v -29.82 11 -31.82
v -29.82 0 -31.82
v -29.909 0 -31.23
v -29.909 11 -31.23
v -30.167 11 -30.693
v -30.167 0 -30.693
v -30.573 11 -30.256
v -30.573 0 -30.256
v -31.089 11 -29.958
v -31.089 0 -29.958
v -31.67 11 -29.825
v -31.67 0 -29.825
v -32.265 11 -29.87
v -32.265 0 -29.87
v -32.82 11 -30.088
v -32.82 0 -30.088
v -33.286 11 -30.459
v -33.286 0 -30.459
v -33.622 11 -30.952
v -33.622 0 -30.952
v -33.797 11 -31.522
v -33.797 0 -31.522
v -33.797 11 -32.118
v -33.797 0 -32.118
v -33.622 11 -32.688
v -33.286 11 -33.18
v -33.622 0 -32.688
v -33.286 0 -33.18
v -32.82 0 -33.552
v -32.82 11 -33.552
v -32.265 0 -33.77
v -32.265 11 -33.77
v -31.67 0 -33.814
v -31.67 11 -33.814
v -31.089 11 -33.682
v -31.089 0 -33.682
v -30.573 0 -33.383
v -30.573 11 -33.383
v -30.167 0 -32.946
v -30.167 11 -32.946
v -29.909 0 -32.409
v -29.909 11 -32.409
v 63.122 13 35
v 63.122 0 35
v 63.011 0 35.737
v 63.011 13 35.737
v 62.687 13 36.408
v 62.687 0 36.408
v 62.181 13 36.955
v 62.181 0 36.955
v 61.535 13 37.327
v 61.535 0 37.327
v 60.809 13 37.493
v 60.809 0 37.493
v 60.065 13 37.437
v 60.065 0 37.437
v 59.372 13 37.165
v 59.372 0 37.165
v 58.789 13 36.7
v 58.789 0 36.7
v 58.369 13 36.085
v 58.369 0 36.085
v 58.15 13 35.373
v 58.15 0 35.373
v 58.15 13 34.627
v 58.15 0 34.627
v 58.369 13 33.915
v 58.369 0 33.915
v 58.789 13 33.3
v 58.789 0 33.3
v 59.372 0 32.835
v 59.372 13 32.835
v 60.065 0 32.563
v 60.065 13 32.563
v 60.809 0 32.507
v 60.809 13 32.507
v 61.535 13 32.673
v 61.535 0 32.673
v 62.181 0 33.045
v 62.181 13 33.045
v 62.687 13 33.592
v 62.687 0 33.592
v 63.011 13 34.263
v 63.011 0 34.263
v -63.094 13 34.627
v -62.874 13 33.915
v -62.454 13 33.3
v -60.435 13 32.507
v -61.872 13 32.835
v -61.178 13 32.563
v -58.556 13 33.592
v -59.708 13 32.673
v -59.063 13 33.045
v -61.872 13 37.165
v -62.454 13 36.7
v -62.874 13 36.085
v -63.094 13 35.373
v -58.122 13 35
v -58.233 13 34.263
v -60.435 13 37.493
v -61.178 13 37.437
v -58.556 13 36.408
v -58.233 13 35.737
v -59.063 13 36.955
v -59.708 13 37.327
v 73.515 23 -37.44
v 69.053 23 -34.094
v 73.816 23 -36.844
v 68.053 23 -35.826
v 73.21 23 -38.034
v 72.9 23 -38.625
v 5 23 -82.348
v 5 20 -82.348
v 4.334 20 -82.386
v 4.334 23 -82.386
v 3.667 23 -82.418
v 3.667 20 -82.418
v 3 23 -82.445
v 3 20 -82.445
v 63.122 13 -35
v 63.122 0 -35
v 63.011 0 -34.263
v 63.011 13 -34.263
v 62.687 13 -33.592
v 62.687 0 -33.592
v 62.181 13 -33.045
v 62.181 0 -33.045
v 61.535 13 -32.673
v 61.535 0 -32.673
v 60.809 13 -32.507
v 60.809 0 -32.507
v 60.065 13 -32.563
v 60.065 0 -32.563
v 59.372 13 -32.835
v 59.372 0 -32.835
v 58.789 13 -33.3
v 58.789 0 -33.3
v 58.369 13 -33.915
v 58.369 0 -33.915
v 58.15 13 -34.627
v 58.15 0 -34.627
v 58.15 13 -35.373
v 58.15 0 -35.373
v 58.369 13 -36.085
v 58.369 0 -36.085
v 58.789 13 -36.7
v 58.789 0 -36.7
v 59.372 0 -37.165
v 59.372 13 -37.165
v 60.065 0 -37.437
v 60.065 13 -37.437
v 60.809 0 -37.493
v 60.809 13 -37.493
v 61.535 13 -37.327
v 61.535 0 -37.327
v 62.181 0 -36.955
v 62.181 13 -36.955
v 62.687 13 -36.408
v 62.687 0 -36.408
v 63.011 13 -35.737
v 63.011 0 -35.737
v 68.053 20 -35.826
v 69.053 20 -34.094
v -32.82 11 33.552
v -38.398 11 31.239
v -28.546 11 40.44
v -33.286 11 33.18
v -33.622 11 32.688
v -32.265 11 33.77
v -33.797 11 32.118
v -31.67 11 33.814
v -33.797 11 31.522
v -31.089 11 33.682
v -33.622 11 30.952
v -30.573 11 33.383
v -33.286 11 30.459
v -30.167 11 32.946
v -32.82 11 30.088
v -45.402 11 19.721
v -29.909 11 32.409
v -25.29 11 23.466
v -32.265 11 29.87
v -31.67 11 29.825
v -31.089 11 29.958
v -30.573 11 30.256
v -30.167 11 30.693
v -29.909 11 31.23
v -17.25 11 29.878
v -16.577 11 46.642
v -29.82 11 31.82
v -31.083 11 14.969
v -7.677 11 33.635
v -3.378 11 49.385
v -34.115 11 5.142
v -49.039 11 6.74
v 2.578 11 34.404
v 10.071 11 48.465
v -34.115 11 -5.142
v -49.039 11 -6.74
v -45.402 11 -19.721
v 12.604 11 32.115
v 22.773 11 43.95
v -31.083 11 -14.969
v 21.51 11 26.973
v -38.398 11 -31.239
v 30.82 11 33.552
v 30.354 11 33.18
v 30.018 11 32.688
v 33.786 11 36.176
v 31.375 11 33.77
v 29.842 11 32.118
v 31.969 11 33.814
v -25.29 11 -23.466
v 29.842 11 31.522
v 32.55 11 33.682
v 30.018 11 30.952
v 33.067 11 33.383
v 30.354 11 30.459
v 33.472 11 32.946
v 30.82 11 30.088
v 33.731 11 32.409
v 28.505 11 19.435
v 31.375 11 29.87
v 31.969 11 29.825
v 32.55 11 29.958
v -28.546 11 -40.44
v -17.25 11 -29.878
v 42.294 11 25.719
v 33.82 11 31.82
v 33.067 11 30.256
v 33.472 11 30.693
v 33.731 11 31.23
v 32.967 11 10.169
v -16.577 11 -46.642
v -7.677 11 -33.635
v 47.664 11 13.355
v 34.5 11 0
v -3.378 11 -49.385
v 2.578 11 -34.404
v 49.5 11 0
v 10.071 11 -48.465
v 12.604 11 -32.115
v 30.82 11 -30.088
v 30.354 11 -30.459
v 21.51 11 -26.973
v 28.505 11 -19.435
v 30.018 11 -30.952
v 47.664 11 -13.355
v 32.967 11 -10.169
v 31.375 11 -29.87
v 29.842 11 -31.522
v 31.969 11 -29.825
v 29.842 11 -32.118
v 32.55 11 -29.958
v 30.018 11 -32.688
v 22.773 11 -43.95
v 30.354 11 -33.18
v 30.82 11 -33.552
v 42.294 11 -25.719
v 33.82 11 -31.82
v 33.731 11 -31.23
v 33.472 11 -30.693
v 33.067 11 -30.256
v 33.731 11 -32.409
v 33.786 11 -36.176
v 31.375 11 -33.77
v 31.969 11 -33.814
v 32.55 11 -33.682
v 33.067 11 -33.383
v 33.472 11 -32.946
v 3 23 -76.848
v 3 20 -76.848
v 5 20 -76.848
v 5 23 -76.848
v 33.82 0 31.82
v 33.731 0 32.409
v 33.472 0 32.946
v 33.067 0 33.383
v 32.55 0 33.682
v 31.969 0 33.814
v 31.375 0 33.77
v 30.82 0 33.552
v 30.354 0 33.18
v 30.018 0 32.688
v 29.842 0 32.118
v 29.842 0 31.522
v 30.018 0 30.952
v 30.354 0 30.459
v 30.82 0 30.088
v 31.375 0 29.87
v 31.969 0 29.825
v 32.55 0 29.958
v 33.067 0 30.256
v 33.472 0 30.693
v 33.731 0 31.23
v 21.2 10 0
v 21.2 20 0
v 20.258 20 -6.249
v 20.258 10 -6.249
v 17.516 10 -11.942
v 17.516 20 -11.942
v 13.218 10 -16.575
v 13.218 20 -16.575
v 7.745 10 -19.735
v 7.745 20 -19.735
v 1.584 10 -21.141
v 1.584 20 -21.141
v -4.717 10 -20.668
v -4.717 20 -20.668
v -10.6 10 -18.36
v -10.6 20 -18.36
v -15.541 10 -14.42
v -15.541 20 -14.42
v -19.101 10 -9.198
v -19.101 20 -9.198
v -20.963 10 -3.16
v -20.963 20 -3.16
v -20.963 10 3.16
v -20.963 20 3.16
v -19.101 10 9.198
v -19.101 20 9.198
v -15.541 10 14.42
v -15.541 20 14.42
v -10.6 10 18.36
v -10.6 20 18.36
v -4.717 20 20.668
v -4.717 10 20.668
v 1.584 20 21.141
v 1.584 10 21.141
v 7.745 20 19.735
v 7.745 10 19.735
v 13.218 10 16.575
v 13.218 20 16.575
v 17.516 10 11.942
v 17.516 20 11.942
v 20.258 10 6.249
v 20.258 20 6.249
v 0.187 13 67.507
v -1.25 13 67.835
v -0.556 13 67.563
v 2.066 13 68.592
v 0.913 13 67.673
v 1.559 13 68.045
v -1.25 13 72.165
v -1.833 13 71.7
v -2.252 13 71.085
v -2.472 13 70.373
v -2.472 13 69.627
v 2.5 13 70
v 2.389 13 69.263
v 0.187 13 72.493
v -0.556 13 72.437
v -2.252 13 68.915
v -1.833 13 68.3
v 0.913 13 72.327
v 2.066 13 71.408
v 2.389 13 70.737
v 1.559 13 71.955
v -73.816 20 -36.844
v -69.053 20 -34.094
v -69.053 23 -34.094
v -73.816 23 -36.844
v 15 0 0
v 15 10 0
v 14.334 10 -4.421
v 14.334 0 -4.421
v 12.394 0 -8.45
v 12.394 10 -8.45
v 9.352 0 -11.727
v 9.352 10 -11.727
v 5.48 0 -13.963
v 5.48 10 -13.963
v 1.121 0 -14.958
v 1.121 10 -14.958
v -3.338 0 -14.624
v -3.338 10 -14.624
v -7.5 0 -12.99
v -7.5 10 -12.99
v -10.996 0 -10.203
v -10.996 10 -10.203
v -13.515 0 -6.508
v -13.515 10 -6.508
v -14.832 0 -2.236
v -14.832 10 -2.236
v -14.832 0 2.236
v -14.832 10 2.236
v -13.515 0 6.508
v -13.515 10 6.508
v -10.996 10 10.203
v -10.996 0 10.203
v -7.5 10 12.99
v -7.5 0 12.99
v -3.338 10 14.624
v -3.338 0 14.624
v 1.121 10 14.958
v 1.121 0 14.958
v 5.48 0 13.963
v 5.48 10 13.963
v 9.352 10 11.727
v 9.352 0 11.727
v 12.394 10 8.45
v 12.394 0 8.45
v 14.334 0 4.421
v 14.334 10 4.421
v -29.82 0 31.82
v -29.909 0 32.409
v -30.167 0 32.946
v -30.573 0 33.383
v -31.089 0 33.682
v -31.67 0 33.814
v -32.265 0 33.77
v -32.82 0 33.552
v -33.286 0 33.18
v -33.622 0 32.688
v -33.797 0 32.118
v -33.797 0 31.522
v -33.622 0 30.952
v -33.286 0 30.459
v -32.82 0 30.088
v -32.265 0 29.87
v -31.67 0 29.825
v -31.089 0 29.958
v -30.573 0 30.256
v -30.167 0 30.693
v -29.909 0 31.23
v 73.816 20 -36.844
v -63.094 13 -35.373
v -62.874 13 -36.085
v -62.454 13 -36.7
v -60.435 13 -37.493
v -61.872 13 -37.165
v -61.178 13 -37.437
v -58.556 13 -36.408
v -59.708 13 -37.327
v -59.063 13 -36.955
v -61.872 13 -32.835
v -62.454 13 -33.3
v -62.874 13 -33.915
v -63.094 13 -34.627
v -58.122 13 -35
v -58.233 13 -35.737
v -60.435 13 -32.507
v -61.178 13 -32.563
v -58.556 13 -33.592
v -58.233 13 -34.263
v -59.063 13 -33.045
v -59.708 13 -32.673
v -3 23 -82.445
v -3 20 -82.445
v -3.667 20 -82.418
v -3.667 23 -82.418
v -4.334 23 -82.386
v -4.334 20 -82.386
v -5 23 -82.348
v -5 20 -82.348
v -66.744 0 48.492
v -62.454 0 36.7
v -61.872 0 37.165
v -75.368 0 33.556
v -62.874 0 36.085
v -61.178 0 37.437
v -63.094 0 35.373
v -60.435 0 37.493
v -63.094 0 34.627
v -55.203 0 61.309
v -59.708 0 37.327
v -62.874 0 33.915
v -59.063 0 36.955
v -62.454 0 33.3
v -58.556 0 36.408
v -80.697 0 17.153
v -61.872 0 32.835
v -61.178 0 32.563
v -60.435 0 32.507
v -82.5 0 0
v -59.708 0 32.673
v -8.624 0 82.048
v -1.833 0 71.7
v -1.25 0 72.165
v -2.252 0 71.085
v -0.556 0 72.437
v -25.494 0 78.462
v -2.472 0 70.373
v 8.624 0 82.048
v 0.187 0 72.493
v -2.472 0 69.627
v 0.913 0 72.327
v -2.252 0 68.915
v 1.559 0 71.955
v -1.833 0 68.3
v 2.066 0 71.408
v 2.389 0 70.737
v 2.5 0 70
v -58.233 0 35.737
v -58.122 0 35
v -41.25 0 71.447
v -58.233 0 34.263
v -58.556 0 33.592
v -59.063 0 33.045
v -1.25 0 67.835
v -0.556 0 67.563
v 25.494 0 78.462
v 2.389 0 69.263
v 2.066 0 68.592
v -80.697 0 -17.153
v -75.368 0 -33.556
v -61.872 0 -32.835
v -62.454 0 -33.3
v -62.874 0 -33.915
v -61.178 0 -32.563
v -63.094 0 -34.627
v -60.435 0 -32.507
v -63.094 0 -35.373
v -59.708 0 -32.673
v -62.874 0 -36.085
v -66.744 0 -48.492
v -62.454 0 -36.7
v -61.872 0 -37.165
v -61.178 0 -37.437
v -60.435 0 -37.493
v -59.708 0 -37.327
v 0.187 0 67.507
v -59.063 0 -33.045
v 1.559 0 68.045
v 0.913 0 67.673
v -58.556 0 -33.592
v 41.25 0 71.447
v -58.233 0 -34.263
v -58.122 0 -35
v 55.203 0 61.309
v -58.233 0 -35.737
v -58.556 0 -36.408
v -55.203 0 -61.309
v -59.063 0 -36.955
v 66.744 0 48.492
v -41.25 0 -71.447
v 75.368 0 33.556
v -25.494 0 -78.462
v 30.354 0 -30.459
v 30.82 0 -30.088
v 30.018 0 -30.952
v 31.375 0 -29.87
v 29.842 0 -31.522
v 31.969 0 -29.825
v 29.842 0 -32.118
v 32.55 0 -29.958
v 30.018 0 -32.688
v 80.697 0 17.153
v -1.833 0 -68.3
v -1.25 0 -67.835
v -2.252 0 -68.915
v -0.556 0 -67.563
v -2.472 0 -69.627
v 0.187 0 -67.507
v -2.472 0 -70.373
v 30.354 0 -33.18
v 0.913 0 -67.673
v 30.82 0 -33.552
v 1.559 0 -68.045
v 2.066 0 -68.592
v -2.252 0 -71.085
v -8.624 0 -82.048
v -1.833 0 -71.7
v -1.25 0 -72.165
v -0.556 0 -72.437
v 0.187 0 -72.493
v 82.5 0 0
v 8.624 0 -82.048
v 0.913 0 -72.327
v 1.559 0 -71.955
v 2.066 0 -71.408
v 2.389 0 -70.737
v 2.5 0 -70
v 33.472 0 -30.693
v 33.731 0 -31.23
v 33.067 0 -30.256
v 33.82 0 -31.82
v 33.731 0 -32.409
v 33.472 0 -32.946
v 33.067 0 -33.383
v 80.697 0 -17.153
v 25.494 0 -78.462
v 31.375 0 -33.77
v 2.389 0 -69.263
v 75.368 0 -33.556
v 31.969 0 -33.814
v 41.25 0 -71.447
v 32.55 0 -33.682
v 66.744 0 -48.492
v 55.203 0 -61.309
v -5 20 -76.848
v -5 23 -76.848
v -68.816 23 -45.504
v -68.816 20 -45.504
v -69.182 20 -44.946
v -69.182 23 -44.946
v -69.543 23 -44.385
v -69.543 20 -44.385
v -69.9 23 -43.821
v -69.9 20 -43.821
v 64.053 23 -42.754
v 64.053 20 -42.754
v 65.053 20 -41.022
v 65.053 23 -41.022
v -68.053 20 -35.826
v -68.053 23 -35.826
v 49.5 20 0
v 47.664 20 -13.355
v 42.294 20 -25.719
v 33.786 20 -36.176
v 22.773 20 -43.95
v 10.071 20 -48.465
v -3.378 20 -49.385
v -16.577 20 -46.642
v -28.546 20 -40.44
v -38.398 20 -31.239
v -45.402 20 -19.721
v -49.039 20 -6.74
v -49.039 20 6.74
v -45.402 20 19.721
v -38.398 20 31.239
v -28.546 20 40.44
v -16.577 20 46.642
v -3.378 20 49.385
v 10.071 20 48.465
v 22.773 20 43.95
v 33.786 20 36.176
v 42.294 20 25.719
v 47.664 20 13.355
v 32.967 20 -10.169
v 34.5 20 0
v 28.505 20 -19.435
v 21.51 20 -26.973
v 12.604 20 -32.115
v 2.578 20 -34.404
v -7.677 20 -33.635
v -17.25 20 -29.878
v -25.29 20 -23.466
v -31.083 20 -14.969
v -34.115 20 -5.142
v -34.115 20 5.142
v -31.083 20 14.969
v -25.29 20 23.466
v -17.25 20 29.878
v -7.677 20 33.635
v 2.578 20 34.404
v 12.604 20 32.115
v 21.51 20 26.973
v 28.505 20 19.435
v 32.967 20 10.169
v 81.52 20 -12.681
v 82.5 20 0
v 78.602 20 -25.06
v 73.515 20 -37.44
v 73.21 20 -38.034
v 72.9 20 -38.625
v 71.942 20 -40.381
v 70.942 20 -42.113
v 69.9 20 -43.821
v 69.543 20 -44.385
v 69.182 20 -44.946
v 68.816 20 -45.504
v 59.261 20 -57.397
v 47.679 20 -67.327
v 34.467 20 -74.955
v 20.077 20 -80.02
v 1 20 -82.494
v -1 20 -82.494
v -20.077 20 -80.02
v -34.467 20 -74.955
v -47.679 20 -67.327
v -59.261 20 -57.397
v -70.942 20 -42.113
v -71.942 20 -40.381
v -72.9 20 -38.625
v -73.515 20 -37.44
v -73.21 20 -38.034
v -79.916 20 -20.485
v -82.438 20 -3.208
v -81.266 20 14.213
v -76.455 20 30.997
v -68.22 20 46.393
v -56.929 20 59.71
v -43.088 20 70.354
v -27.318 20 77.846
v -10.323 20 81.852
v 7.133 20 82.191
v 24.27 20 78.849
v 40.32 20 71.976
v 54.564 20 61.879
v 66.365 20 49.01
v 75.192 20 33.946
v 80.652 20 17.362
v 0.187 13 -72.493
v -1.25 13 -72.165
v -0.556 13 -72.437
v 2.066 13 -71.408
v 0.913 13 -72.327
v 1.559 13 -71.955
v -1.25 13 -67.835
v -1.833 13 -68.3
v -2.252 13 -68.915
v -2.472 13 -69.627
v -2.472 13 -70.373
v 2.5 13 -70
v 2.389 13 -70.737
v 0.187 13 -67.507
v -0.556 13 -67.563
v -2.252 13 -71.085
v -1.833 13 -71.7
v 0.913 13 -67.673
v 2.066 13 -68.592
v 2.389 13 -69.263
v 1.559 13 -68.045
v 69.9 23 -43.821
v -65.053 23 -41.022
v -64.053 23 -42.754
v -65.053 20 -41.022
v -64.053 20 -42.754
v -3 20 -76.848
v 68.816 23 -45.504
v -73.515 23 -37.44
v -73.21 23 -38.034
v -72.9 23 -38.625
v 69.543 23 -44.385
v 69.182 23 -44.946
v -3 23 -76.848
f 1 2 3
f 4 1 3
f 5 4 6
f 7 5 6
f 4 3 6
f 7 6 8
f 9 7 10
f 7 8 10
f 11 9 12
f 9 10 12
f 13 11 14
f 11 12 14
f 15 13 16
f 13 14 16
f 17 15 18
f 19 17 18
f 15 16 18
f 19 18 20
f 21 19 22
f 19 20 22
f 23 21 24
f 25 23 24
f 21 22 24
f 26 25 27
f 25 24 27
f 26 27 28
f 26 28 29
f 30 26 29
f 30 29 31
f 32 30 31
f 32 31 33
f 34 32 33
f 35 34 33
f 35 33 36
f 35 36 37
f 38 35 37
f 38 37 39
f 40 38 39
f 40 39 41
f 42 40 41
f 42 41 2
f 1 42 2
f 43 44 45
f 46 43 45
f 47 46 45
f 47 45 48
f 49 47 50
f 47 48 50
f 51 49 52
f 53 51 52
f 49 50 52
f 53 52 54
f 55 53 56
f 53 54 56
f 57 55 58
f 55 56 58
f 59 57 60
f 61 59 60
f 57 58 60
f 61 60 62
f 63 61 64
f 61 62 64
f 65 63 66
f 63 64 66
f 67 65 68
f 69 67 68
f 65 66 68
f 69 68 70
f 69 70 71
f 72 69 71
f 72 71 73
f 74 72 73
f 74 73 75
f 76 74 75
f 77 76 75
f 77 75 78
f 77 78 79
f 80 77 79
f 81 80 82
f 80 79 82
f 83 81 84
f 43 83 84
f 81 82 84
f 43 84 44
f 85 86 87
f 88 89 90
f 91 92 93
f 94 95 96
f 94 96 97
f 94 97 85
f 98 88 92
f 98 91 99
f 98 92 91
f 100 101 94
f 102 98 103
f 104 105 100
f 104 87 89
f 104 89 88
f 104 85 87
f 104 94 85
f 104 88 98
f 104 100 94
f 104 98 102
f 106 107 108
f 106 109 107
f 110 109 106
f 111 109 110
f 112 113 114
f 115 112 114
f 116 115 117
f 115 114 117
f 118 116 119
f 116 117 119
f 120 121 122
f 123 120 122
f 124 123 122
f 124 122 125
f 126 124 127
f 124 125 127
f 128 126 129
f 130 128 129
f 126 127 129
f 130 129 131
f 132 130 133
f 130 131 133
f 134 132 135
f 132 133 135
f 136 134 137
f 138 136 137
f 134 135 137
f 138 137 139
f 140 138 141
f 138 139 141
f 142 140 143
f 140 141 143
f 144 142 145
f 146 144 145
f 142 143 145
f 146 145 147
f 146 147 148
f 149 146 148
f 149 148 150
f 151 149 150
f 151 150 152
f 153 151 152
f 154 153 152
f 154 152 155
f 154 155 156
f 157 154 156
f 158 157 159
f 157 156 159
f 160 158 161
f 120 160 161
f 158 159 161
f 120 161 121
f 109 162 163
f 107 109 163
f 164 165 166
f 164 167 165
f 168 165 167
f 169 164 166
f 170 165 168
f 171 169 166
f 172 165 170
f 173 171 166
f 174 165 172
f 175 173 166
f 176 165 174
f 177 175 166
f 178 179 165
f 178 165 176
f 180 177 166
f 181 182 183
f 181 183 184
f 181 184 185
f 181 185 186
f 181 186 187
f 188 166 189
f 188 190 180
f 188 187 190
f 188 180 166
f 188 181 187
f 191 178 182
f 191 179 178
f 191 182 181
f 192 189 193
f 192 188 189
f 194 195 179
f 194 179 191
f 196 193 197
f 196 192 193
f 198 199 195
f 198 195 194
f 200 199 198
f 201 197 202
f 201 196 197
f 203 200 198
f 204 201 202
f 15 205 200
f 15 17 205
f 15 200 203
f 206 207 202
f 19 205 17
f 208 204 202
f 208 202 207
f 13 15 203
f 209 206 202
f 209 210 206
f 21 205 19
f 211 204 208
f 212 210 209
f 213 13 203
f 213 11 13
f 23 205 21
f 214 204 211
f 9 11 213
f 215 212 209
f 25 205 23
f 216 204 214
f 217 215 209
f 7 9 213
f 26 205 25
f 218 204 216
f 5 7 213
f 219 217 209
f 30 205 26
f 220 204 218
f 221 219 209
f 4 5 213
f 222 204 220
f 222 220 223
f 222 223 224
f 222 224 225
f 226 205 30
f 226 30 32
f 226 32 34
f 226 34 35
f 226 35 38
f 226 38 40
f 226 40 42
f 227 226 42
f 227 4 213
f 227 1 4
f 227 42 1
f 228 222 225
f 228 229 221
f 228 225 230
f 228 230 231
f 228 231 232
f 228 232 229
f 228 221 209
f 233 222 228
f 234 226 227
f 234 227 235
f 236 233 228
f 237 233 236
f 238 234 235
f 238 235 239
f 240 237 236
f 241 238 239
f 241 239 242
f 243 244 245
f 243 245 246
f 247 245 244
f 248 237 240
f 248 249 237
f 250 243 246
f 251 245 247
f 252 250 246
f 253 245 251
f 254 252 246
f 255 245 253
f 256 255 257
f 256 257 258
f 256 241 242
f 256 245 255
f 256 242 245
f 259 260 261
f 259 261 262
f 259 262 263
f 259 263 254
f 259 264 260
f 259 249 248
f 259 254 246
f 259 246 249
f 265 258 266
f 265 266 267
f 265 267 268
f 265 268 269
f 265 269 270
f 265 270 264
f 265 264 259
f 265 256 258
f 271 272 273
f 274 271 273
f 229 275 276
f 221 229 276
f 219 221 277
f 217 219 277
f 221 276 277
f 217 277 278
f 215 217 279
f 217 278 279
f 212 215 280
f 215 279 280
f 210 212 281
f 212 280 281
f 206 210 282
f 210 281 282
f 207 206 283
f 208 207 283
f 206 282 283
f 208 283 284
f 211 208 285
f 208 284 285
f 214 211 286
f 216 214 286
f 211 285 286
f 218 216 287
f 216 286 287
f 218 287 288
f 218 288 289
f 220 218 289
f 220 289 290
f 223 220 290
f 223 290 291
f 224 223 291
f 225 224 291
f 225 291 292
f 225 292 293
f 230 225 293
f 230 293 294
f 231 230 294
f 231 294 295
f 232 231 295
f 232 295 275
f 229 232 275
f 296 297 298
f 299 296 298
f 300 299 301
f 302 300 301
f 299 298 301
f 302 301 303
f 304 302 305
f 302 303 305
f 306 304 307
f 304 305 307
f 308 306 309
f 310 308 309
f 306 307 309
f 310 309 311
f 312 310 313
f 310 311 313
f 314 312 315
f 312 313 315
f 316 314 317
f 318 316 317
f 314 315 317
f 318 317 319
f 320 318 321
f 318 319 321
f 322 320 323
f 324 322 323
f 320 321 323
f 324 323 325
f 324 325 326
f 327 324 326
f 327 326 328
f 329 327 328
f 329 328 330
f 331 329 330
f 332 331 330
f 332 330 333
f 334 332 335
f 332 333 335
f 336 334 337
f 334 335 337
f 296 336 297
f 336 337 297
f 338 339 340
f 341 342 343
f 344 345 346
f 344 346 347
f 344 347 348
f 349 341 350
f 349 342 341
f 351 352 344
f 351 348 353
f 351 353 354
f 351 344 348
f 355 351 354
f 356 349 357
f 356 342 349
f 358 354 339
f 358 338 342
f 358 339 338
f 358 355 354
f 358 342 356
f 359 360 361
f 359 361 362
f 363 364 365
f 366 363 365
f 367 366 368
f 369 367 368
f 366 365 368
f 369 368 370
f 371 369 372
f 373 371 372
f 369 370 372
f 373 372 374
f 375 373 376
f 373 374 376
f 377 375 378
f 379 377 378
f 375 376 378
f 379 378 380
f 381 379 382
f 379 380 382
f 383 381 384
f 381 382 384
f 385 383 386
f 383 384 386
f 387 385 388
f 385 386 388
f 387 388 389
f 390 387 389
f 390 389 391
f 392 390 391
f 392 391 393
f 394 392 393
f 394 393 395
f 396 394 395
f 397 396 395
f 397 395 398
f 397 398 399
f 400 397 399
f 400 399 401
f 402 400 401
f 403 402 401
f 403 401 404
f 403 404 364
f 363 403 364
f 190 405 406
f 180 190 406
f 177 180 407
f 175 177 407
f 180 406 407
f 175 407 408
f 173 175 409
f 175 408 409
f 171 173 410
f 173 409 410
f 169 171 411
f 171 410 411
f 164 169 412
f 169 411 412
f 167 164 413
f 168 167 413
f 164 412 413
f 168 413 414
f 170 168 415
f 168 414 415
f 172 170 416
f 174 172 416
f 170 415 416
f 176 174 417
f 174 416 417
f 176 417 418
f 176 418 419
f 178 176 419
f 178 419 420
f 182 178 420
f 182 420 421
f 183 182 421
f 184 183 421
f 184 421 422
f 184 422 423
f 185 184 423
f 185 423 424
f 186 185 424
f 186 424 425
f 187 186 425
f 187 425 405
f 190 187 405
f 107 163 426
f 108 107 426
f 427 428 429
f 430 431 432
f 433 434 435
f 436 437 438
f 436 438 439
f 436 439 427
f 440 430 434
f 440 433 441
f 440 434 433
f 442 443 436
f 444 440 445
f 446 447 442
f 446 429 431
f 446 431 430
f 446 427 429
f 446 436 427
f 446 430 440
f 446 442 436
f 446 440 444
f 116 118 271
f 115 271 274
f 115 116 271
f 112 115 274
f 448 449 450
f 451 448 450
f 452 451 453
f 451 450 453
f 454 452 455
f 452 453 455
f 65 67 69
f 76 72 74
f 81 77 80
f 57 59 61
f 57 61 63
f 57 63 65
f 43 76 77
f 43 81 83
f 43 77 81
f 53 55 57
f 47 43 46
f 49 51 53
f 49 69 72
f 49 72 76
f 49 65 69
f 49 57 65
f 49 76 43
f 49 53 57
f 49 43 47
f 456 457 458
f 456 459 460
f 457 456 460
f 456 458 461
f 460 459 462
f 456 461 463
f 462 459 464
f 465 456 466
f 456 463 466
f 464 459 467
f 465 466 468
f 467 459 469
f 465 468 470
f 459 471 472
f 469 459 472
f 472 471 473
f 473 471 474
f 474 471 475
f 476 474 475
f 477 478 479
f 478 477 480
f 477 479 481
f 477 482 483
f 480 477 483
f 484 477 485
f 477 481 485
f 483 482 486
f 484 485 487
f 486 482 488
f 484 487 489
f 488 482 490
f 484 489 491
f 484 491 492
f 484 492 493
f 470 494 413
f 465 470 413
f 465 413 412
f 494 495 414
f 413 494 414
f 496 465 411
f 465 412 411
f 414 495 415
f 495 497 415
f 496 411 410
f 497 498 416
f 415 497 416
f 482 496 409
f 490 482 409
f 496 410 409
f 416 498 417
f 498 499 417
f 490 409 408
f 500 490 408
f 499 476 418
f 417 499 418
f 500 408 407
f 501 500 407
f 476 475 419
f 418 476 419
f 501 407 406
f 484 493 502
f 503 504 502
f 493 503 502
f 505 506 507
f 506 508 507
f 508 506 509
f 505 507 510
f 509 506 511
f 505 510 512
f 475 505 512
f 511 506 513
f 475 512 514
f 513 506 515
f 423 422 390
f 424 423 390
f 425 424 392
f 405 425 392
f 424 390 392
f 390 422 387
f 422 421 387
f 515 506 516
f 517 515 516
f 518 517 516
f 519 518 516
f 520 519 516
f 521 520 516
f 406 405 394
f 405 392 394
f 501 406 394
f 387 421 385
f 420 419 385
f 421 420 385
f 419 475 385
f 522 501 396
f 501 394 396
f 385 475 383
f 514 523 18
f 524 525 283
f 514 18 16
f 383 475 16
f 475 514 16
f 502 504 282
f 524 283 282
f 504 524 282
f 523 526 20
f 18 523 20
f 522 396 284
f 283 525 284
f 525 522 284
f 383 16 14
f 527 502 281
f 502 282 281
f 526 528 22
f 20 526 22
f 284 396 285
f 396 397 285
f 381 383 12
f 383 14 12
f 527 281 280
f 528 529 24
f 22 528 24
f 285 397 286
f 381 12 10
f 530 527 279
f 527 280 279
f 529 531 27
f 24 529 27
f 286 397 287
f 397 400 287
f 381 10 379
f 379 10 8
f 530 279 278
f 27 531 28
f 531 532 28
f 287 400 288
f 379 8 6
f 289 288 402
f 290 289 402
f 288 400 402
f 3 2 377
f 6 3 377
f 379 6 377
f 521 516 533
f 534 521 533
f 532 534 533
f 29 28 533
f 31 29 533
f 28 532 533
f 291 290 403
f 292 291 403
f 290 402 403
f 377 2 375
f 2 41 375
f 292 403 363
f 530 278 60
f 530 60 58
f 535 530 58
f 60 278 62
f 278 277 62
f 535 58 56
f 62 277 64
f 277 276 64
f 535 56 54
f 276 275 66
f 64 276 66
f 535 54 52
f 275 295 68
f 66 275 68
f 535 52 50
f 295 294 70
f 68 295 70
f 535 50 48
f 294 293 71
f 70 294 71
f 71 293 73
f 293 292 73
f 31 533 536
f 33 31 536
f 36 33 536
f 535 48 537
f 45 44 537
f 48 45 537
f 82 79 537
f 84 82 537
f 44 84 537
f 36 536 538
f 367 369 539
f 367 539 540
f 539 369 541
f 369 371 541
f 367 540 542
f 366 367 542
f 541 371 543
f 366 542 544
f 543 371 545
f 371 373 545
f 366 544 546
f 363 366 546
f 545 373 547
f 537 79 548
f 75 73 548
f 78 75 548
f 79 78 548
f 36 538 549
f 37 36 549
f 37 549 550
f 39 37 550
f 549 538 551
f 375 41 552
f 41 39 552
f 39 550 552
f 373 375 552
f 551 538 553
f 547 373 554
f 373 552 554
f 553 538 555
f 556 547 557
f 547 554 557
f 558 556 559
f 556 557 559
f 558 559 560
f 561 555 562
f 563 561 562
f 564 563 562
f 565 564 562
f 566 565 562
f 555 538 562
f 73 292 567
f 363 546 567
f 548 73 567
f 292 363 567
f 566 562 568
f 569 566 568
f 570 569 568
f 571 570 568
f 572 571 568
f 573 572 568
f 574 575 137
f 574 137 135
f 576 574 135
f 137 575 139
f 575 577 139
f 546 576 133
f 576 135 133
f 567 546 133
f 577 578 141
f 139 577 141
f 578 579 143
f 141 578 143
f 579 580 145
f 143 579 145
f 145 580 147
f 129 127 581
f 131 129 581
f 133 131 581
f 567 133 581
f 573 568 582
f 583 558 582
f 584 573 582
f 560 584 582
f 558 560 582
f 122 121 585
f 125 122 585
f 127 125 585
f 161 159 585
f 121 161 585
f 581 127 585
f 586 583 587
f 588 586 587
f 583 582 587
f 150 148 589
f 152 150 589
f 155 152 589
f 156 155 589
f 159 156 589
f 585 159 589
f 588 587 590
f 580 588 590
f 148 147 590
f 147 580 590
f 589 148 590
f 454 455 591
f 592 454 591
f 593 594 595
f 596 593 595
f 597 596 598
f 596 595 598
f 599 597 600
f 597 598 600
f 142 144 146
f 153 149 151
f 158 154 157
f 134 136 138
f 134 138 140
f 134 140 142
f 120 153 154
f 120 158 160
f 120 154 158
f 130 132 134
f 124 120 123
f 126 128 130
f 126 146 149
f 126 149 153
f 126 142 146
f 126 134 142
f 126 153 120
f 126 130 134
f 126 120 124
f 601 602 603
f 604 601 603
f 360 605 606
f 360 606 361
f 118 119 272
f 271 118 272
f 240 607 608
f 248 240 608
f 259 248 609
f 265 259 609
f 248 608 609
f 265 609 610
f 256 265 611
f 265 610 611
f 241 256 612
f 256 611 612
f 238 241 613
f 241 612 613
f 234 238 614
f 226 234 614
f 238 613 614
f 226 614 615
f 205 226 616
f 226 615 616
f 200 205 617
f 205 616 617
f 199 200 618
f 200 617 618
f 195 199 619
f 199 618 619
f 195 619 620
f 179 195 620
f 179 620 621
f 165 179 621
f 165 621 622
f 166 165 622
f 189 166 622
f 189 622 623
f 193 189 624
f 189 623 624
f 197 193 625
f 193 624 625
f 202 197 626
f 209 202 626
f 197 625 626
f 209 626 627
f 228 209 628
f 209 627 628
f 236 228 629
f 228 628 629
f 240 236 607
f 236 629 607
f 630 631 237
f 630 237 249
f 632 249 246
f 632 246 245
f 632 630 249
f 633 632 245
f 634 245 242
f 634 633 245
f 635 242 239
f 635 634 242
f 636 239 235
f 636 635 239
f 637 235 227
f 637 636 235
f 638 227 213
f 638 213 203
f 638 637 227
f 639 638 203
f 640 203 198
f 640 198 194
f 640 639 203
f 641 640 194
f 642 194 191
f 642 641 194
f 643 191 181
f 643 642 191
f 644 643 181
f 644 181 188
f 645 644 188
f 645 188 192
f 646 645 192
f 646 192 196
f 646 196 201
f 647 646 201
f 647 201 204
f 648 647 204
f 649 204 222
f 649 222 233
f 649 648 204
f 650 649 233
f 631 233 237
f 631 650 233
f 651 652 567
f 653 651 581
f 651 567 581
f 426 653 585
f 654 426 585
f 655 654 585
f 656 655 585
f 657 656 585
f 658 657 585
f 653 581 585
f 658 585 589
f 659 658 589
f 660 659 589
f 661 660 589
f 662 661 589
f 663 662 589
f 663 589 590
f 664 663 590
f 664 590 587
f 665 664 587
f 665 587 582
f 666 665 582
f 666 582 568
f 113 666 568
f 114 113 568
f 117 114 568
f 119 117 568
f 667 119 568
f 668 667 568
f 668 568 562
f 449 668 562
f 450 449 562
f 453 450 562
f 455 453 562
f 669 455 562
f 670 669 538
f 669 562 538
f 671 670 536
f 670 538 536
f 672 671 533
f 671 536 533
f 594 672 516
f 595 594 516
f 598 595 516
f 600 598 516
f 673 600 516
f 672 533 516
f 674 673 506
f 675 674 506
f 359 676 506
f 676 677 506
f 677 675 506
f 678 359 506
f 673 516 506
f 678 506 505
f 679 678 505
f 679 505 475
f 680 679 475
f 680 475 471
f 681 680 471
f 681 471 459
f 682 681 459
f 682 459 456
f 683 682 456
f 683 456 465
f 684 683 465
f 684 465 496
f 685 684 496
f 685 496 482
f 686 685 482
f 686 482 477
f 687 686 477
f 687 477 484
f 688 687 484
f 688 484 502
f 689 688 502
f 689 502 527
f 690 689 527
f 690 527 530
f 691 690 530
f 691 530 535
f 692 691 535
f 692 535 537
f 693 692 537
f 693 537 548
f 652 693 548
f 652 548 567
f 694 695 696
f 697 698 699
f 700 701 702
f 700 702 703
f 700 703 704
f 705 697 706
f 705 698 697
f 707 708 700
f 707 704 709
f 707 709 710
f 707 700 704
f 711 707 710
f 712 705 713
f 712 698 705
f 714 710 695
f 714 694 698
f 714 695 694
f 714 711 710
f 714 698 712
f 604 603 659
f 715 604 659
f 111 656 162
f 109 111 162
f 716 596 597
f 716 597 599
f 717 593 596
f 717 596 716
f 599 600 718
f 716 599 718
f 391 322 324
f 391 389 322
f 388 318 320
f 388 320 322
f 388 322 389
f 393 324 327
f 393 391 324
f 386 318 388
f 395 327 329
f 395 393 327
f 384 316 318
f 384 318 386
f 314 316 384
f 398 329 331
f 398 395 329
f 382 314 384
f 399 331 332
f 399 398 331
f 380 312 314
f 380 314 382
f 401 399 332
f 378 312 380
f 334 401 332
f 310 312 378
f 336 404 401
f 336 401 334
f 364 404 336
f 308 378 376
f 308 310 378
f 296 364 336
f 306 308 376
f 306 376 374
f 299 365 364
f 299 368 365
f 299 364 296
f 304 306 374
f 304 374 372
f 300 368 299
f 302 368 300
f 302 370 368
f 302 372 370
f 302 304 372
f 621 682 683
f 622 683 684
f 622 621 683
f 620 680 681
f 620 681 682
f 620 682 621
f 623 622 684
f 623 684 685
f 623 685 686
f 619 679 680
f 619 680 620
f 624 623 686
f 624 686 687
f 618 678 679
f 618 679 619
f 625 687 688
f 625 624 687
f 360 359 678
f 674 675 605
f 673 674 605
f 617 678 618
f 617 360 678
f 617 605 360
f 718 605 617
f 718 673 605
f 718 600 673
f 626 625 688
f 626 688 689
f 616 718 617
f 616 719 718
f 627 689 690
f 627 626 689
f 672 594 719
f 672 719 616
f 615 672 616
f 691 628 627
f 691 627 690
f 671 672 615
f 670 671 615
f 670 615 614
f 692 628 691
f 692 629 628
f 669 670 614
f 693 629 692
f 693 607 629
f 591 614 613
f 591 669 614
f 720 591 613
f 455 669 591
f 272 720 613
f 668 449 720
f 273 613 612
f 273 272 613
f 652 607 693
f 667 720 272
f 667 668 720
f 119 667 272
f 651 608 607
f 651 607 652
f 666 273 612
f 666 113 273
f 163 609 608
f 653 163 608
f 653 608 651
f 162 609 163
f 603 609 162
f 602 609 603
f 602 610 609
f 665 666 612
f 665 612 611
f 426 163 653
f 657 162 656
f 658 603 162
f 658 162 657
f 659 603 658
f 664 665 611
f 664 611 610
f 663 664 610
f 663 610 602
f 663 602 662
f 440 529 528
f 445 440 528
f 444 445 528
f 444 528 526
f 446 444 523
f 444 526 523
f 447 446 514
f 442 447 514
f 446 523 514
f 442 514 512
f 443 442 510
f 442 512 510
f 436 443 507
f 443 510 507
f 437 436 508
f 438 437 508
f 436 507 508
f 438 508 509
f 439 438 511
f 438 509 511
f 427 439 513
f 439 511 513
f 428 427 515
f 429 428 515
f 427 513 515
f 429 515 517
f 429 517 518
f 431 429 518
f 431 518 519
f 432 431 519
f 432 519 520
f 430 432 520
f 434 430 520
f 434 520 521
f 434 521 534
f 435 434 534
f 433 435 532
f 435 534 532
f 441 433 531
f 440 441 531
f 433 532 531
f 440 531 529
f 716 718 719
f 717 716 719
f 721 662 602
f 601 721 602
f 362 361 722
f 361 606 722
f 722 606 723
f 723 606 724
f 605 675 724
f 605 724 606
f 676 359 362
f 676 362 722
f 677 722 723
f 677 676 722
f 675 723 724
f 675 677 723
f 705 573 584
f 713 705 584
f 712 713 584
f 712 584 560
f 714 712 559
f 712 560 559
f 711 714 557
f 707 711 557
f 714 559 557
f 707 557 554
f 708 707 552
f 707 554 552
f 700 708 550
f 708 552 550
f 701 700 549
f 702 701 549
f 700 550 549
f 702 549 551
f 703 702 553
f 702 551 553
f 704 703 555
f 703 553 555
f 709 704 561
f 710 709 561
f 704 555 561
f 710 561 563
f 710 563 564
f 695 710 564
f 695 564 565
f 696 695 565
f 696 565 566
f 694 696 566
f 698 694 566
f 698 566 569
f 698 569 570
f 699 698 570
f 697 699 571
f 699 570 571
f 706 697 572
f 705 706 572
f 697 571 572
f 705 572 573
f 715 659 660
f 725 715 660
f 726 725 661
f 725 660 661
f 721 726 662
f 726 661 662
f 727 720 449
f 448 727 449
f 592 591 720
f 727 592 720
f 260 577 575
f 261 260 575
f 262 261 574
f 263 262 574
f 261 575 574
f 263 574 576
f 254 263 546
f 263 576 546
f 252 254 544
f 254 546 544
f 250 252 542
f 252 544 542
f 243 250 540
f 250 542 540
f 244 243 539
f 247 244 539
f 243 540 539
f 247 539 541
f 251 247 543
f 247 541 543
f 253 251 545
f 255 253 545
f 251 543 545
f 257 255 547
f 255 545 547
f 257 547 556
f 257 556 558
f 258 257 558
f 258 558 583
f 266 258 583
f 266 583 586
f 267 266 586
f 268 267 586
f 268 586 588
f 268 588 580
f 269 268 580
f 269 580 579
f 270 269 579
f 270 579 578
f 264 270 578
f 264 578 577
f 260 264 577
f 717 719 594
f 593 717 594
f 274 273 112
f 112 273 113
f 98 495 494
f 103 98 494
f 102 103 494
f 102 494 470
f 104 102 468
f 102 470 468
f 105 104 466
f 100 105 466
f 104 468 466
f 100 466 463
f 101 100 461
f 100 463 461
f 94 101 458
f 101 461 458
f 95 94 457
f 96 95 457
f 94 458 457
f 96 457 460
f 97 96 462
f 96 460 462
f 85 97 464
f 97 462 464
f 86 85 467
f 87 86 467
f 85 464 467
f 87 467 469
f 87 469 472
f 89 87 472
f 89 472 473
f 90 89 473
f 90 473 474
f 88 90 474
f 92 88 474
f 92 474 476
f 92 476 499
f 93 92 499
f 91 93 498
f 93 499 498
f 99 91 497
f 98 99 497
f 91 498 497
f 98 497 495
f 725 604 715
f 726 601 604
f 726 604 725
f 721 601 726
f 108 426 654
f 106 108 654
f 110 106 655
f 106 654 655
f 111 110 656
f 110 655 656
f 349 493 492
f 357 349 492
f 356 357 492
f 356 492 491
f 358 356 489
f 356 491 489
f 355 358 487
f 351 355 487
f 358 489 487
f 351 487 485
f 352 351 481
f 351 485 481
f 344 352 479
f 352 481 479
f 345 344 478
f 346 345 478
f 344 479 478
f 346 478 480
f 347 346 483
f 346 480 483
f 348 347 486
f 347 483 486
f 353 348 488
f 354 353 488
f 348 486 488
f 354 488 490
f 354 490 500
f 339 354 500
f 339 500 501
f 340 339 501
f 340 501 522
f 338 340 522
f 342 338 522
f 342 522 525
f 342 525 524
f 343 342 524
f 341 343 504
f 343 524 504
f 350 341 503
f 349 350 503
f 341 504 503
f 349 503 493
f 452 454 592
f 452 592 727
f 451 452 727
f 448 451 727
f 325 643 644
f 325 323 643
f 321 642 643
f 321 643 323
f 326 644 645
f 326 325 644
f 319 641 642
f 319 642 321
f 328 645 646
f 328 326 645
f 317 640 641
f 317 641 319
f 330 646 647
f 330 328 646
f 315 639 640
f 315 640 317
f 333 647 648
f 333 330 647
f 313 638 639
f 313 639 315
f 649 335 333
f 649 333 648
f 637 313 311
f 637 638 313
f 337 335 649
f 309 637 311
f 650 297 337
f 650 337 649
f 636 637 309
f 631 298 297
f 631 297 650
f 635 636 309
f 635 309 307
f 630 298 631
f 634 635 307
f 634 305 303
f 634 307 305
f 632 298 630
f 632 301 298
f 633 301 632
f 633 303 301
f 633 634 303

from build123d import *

# Parameters (mm, degrees)
SKETCH1_R           = 82.5
BOSS_EXTRUDE1_DEPTH = 20
SKETCH2_R           = 15
CUT_EXTRUDE1_DEPTH  = 20
SKETCH3_R           = 49.5
SKETCH3_R_2         = 34.5
CUT_EXTRUDE2_DEPTH  = 9
SKETCH4_R           = 2.5
CUT_EXTRUDE3_DEPTH  = 13
SKETCH5_R           = 2
CUT_EXTRUDE4_DEPTH  = 17
SKETCH7_R           = 21.2
SKETCH7_R_2         = 15
CUT_EXTRUDE5_DEPTH  = 10
BOSS_EXTRUDE2_DEPTH = 3


with BuildPart() as part:
    # Sketch1 → Boss-Extrude1 (new body)
    with BuildSketch(Plane(origin=(0, 0, 0), x_dir=(1, 0, 0), z_dir=(0, 1, 0))):
        Circle(SKETCH1_R)
    extrude(amount=BOSS_EXTRUDE1_DEPTH)

    # Sketch2 → Cut-Extrude1 (cut)
    with BuildSketch(Plane(origin=(0, 20, 0), x_dir=(1, 0, 0), z_dir=(0, 1, 0))):
        Circle(SKETCH2_R)
    extrude(amount=-CUT_EXTRUDE1_DEPTH, mode=Mode.SUBTRACT)

    # Sketch3 → Cut-Extrude2 (cut)
    with BuildSketch(Plane(origin=(0, 20, 0), x_dir=(1, 0, 0), z_dir=(0, 1, 0))):
        Circle(SKETCH3_R)
        Circle(SKETCH3_R_2, mode=Mode.SUBTRACT)
    extrude(amount=-CUT_EXTRUDE2_DEPTH, mode=Mode.SUBTRACT)

    # Sketch4 → Cut-Extrude3 (cut)
    with BuildSketch(Plane.XZ):
        with Locations((0, 70)):
            Circle(SKETCH4_R)
        with Locations((60.621778265, 35)):
            Circle(SKETCH4_R)
        with Locations((60.621778265, -35)):
            Circle(SKETCH4_R)
        with Locations((0, -70)):
            Circle(SKETCH4_R)
        with Locations((-60.621778265, -35)):
            Circle(SKETCH4_R)
        with Locations((-60.621778265, 35)):
            Circle(SKETCH4_R)
    extrude(amount=-CUT_EXTRUDE3_DEPTH, mode=Mode.SUBTRACT)

    # Sketch5 → Cut-Extrude4 (cut)
    with BuildSketch(Plane.XZ):
        with Locations((31.819805153, 31.819805153)):
            Circle(SKETCH5_R)
        with Locations((31.819805153, -31.819805153)):
            Circle(SKETCH5_R)
        with Locations((-31.819805153, -31.819805153)):
            Circle(SKETCH5_R)
        with Locations((-31.819805153, 31.819805153)):
            Circle(SKETCH5_R)
    extrude(amount=-CUT_EXTRUDE4_DEPTH, mode=Mode.SUBTRACT)

    # Sketch7 → Cut-Extrude5 (cut)
    with BuildSketch(Plane(origin=(0, 20, 0), x_dir=(1, 0, 0), z_dir=(0, 1, 0))):
        Circle(SKETCH7_R)
        Circle(SKETCH7_R_2, mode=Mode.SUBTRACT)
    extrude(amount=-CUT_EXTRUDE5_DEPTH, mode=Mode.SUBTRACT)

    # Sketch8 → Boss-Extrude2 (add)
    with BuildSketch(Plane(origin=(0, 20, 0), x_dir=(1, 0, 0), z_dir=(0, 1, 0))):
        with BuildLine():
            Line((-5, 82.34834546), (-5, 76.84834546))
            Line((-5, 76.84834546), (-3, 76.84834546))
            Line((-3, 76.84834546), (-3, 82.445436502))
            ThreePointArc((-3, 82.445436502), (-4.000294573, 82.402958948), (-5, 82.34834546))
        make_face()
        with BuildLine():
            Line((5, 76.84834546), (5, 82.34834546))
            ThreePointArc((5, 82.34834546), (4.000294573, 82.402958948), (3, 82.445436502))
            Line((3, 82.445436502), (3, 76.84834546))
            Line((3, 76.84834546), (5, 76.84834546))
        make_face()
        with BuildLine():
            Line((64.052619407, 42.754299749), (65.052619407, 41.022248941))
            Line((65.052619407, 41.022248941), (69.899842437, 43.820794462))
            ThreePointArc((69.899842437, 43.820794462), (69.362908509, 44.665836196), (68.815759128, 45.504299749))
            Line((68.815759128, 45.504299749), (64.052619407, 42.754299749))
        make_face()
        with BuildLine():
            Line((69.052619407, 34.094045711), (73.815759128, 36.844045711))
            ThreePointArc((73.815759128, 36.844045711), (73.363203082, 37.737122751), (72.899842437, 38.62464204))
            Line((72.899842437, 38.62464204), (68.052619407, 35.826096519))
            Line((68.052619407, 35.826096519), (69.052619407, 34.094045711))
        make_face()
        with BuildLine():
            Line((-64.052619407, 42.754299749), (-68.815759128, 45.504299749))
            ThreePointArc((-68.815759128, 45.504299749), (-69.362908509, 44.665836196), (-69.899842437, 43.820794462))
            Line((-69.899842437, 43.820794462), (-65.052619407, 41.022248941))
            Line((-65.052619407, 41.022248941), (-64.052619407, 42.754299749))
        make_face()
        with BuildLine():
            Line((-69.052619407, 34.094045711), (-73.815759128, 36.844045711))
            ThreePointArc((-73.815759128, 36.844045711), (-73.363203082, 37.737122751), (-72.899842437, 38.62464204))
            Line((-72.899842437, 38.62464204), (-68.052619407, 35.826096519))
            Line((-68.052619407, 35.826096519), (-69.052619407, 34.094045711))
        make_face()
    extrude(amount=BOSS_EXTRUDE2_DEPTH)


solid = part.part
